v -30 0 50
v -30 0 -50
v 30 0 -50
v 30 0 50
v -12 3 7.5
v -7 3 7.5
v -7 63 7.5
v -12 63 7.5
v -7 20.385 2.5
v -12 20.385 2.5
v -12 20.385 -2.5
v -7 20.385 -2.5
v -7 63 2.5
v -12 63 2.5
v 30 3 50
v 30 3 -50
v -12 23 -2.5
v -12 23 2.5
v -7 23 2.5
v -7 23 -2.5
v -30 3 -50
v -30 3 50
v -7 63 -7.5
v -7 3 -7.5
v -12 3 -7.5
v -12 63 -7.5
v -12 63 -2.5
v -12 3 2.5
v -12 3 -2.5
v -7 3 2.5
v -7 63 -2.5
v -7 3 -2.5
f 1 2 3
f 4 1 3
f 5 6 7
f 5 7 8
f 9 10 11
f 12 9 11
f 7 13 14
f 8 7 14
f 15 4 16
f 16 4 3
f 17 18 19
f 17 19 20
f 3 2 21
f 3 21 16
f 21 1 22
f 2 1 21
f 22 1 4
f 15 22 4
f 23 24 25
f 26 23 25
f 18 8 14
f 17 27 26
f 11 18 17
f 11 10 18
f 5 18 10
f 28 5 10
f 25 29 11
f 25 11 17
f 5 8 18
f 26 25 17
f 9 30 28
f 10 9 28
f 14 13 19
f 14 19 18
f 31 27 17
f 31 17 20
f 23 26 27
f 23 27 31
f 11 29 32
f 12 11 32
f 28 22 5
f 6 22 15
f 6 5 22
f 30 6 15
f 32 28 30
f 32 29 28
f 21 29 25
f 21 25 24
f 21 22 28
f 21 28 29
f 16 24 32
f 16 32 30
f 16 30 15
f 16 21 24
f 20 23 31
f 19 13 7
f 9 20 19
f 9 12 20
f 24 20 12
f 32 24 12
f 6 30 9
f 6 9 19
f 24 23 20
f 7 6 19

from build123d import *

# Parameters (mm, degrees)
SKETCH1_W           = 60
SKETCH1_H           = 100
BOSS_EXTRUDE1_DEPTH = 3
BOSS_EXTRUDE2_DEPTH = 60
BOSS_EXTRUDE3_START = -5
SKETCH3_W           = 5
SKETCH3_H           = 2.614864802
BOSS_EXTRUDE3_DEPTH = 5


with BuildPart() as part:
    # Sketch1 → Boss-Extrude1 (new body)
    with BuildSketch(Plane(origin=(0, 0, 0), x_dir=(1, 0, 0), z_dir=(0, 1, 0))):
        Rectangle(SKETCH1_W, SKETCH1_H)
    extrude(amount=BOSS_EXTRUDE1_DEPTH)

    # Sketch2 → Boss-Extrude2 (add)
    with BuildSketch(Plane(origin=(0, 3, 0), x_dir=(1, 0, 0), z_dir=(0, 1, 0))):
        Polygon((-9.5, 2.5), (-7, 2.5), (-7, 7.5), (-12, 7.5), (-12, 2.5), align=None)
        Polygon((-9.5, -2.5), (-7, -2.5), (-7, -7.5), (-12, -7.5), (-12, -2.5), align=None)
    extrude(amount=BOSS_EXTRUDE2_DEPTH)

    # Sketch3 → Boss-Extrude3 (add)
    with BuildSketch(Plane(origin=(-7, 0, 0), x_dir=(0, 0, -1), z_dir=(1, 0, 0)).offset(BOSS_EXTRUDE3_START)):
        with Locations((0, 21.692567599)):
            Rectangle(SKETCH3_W, SKETCH3_H)
    extrude(amount=BOSS_EXTRUDE3_DEPTH)


solid = part.part
